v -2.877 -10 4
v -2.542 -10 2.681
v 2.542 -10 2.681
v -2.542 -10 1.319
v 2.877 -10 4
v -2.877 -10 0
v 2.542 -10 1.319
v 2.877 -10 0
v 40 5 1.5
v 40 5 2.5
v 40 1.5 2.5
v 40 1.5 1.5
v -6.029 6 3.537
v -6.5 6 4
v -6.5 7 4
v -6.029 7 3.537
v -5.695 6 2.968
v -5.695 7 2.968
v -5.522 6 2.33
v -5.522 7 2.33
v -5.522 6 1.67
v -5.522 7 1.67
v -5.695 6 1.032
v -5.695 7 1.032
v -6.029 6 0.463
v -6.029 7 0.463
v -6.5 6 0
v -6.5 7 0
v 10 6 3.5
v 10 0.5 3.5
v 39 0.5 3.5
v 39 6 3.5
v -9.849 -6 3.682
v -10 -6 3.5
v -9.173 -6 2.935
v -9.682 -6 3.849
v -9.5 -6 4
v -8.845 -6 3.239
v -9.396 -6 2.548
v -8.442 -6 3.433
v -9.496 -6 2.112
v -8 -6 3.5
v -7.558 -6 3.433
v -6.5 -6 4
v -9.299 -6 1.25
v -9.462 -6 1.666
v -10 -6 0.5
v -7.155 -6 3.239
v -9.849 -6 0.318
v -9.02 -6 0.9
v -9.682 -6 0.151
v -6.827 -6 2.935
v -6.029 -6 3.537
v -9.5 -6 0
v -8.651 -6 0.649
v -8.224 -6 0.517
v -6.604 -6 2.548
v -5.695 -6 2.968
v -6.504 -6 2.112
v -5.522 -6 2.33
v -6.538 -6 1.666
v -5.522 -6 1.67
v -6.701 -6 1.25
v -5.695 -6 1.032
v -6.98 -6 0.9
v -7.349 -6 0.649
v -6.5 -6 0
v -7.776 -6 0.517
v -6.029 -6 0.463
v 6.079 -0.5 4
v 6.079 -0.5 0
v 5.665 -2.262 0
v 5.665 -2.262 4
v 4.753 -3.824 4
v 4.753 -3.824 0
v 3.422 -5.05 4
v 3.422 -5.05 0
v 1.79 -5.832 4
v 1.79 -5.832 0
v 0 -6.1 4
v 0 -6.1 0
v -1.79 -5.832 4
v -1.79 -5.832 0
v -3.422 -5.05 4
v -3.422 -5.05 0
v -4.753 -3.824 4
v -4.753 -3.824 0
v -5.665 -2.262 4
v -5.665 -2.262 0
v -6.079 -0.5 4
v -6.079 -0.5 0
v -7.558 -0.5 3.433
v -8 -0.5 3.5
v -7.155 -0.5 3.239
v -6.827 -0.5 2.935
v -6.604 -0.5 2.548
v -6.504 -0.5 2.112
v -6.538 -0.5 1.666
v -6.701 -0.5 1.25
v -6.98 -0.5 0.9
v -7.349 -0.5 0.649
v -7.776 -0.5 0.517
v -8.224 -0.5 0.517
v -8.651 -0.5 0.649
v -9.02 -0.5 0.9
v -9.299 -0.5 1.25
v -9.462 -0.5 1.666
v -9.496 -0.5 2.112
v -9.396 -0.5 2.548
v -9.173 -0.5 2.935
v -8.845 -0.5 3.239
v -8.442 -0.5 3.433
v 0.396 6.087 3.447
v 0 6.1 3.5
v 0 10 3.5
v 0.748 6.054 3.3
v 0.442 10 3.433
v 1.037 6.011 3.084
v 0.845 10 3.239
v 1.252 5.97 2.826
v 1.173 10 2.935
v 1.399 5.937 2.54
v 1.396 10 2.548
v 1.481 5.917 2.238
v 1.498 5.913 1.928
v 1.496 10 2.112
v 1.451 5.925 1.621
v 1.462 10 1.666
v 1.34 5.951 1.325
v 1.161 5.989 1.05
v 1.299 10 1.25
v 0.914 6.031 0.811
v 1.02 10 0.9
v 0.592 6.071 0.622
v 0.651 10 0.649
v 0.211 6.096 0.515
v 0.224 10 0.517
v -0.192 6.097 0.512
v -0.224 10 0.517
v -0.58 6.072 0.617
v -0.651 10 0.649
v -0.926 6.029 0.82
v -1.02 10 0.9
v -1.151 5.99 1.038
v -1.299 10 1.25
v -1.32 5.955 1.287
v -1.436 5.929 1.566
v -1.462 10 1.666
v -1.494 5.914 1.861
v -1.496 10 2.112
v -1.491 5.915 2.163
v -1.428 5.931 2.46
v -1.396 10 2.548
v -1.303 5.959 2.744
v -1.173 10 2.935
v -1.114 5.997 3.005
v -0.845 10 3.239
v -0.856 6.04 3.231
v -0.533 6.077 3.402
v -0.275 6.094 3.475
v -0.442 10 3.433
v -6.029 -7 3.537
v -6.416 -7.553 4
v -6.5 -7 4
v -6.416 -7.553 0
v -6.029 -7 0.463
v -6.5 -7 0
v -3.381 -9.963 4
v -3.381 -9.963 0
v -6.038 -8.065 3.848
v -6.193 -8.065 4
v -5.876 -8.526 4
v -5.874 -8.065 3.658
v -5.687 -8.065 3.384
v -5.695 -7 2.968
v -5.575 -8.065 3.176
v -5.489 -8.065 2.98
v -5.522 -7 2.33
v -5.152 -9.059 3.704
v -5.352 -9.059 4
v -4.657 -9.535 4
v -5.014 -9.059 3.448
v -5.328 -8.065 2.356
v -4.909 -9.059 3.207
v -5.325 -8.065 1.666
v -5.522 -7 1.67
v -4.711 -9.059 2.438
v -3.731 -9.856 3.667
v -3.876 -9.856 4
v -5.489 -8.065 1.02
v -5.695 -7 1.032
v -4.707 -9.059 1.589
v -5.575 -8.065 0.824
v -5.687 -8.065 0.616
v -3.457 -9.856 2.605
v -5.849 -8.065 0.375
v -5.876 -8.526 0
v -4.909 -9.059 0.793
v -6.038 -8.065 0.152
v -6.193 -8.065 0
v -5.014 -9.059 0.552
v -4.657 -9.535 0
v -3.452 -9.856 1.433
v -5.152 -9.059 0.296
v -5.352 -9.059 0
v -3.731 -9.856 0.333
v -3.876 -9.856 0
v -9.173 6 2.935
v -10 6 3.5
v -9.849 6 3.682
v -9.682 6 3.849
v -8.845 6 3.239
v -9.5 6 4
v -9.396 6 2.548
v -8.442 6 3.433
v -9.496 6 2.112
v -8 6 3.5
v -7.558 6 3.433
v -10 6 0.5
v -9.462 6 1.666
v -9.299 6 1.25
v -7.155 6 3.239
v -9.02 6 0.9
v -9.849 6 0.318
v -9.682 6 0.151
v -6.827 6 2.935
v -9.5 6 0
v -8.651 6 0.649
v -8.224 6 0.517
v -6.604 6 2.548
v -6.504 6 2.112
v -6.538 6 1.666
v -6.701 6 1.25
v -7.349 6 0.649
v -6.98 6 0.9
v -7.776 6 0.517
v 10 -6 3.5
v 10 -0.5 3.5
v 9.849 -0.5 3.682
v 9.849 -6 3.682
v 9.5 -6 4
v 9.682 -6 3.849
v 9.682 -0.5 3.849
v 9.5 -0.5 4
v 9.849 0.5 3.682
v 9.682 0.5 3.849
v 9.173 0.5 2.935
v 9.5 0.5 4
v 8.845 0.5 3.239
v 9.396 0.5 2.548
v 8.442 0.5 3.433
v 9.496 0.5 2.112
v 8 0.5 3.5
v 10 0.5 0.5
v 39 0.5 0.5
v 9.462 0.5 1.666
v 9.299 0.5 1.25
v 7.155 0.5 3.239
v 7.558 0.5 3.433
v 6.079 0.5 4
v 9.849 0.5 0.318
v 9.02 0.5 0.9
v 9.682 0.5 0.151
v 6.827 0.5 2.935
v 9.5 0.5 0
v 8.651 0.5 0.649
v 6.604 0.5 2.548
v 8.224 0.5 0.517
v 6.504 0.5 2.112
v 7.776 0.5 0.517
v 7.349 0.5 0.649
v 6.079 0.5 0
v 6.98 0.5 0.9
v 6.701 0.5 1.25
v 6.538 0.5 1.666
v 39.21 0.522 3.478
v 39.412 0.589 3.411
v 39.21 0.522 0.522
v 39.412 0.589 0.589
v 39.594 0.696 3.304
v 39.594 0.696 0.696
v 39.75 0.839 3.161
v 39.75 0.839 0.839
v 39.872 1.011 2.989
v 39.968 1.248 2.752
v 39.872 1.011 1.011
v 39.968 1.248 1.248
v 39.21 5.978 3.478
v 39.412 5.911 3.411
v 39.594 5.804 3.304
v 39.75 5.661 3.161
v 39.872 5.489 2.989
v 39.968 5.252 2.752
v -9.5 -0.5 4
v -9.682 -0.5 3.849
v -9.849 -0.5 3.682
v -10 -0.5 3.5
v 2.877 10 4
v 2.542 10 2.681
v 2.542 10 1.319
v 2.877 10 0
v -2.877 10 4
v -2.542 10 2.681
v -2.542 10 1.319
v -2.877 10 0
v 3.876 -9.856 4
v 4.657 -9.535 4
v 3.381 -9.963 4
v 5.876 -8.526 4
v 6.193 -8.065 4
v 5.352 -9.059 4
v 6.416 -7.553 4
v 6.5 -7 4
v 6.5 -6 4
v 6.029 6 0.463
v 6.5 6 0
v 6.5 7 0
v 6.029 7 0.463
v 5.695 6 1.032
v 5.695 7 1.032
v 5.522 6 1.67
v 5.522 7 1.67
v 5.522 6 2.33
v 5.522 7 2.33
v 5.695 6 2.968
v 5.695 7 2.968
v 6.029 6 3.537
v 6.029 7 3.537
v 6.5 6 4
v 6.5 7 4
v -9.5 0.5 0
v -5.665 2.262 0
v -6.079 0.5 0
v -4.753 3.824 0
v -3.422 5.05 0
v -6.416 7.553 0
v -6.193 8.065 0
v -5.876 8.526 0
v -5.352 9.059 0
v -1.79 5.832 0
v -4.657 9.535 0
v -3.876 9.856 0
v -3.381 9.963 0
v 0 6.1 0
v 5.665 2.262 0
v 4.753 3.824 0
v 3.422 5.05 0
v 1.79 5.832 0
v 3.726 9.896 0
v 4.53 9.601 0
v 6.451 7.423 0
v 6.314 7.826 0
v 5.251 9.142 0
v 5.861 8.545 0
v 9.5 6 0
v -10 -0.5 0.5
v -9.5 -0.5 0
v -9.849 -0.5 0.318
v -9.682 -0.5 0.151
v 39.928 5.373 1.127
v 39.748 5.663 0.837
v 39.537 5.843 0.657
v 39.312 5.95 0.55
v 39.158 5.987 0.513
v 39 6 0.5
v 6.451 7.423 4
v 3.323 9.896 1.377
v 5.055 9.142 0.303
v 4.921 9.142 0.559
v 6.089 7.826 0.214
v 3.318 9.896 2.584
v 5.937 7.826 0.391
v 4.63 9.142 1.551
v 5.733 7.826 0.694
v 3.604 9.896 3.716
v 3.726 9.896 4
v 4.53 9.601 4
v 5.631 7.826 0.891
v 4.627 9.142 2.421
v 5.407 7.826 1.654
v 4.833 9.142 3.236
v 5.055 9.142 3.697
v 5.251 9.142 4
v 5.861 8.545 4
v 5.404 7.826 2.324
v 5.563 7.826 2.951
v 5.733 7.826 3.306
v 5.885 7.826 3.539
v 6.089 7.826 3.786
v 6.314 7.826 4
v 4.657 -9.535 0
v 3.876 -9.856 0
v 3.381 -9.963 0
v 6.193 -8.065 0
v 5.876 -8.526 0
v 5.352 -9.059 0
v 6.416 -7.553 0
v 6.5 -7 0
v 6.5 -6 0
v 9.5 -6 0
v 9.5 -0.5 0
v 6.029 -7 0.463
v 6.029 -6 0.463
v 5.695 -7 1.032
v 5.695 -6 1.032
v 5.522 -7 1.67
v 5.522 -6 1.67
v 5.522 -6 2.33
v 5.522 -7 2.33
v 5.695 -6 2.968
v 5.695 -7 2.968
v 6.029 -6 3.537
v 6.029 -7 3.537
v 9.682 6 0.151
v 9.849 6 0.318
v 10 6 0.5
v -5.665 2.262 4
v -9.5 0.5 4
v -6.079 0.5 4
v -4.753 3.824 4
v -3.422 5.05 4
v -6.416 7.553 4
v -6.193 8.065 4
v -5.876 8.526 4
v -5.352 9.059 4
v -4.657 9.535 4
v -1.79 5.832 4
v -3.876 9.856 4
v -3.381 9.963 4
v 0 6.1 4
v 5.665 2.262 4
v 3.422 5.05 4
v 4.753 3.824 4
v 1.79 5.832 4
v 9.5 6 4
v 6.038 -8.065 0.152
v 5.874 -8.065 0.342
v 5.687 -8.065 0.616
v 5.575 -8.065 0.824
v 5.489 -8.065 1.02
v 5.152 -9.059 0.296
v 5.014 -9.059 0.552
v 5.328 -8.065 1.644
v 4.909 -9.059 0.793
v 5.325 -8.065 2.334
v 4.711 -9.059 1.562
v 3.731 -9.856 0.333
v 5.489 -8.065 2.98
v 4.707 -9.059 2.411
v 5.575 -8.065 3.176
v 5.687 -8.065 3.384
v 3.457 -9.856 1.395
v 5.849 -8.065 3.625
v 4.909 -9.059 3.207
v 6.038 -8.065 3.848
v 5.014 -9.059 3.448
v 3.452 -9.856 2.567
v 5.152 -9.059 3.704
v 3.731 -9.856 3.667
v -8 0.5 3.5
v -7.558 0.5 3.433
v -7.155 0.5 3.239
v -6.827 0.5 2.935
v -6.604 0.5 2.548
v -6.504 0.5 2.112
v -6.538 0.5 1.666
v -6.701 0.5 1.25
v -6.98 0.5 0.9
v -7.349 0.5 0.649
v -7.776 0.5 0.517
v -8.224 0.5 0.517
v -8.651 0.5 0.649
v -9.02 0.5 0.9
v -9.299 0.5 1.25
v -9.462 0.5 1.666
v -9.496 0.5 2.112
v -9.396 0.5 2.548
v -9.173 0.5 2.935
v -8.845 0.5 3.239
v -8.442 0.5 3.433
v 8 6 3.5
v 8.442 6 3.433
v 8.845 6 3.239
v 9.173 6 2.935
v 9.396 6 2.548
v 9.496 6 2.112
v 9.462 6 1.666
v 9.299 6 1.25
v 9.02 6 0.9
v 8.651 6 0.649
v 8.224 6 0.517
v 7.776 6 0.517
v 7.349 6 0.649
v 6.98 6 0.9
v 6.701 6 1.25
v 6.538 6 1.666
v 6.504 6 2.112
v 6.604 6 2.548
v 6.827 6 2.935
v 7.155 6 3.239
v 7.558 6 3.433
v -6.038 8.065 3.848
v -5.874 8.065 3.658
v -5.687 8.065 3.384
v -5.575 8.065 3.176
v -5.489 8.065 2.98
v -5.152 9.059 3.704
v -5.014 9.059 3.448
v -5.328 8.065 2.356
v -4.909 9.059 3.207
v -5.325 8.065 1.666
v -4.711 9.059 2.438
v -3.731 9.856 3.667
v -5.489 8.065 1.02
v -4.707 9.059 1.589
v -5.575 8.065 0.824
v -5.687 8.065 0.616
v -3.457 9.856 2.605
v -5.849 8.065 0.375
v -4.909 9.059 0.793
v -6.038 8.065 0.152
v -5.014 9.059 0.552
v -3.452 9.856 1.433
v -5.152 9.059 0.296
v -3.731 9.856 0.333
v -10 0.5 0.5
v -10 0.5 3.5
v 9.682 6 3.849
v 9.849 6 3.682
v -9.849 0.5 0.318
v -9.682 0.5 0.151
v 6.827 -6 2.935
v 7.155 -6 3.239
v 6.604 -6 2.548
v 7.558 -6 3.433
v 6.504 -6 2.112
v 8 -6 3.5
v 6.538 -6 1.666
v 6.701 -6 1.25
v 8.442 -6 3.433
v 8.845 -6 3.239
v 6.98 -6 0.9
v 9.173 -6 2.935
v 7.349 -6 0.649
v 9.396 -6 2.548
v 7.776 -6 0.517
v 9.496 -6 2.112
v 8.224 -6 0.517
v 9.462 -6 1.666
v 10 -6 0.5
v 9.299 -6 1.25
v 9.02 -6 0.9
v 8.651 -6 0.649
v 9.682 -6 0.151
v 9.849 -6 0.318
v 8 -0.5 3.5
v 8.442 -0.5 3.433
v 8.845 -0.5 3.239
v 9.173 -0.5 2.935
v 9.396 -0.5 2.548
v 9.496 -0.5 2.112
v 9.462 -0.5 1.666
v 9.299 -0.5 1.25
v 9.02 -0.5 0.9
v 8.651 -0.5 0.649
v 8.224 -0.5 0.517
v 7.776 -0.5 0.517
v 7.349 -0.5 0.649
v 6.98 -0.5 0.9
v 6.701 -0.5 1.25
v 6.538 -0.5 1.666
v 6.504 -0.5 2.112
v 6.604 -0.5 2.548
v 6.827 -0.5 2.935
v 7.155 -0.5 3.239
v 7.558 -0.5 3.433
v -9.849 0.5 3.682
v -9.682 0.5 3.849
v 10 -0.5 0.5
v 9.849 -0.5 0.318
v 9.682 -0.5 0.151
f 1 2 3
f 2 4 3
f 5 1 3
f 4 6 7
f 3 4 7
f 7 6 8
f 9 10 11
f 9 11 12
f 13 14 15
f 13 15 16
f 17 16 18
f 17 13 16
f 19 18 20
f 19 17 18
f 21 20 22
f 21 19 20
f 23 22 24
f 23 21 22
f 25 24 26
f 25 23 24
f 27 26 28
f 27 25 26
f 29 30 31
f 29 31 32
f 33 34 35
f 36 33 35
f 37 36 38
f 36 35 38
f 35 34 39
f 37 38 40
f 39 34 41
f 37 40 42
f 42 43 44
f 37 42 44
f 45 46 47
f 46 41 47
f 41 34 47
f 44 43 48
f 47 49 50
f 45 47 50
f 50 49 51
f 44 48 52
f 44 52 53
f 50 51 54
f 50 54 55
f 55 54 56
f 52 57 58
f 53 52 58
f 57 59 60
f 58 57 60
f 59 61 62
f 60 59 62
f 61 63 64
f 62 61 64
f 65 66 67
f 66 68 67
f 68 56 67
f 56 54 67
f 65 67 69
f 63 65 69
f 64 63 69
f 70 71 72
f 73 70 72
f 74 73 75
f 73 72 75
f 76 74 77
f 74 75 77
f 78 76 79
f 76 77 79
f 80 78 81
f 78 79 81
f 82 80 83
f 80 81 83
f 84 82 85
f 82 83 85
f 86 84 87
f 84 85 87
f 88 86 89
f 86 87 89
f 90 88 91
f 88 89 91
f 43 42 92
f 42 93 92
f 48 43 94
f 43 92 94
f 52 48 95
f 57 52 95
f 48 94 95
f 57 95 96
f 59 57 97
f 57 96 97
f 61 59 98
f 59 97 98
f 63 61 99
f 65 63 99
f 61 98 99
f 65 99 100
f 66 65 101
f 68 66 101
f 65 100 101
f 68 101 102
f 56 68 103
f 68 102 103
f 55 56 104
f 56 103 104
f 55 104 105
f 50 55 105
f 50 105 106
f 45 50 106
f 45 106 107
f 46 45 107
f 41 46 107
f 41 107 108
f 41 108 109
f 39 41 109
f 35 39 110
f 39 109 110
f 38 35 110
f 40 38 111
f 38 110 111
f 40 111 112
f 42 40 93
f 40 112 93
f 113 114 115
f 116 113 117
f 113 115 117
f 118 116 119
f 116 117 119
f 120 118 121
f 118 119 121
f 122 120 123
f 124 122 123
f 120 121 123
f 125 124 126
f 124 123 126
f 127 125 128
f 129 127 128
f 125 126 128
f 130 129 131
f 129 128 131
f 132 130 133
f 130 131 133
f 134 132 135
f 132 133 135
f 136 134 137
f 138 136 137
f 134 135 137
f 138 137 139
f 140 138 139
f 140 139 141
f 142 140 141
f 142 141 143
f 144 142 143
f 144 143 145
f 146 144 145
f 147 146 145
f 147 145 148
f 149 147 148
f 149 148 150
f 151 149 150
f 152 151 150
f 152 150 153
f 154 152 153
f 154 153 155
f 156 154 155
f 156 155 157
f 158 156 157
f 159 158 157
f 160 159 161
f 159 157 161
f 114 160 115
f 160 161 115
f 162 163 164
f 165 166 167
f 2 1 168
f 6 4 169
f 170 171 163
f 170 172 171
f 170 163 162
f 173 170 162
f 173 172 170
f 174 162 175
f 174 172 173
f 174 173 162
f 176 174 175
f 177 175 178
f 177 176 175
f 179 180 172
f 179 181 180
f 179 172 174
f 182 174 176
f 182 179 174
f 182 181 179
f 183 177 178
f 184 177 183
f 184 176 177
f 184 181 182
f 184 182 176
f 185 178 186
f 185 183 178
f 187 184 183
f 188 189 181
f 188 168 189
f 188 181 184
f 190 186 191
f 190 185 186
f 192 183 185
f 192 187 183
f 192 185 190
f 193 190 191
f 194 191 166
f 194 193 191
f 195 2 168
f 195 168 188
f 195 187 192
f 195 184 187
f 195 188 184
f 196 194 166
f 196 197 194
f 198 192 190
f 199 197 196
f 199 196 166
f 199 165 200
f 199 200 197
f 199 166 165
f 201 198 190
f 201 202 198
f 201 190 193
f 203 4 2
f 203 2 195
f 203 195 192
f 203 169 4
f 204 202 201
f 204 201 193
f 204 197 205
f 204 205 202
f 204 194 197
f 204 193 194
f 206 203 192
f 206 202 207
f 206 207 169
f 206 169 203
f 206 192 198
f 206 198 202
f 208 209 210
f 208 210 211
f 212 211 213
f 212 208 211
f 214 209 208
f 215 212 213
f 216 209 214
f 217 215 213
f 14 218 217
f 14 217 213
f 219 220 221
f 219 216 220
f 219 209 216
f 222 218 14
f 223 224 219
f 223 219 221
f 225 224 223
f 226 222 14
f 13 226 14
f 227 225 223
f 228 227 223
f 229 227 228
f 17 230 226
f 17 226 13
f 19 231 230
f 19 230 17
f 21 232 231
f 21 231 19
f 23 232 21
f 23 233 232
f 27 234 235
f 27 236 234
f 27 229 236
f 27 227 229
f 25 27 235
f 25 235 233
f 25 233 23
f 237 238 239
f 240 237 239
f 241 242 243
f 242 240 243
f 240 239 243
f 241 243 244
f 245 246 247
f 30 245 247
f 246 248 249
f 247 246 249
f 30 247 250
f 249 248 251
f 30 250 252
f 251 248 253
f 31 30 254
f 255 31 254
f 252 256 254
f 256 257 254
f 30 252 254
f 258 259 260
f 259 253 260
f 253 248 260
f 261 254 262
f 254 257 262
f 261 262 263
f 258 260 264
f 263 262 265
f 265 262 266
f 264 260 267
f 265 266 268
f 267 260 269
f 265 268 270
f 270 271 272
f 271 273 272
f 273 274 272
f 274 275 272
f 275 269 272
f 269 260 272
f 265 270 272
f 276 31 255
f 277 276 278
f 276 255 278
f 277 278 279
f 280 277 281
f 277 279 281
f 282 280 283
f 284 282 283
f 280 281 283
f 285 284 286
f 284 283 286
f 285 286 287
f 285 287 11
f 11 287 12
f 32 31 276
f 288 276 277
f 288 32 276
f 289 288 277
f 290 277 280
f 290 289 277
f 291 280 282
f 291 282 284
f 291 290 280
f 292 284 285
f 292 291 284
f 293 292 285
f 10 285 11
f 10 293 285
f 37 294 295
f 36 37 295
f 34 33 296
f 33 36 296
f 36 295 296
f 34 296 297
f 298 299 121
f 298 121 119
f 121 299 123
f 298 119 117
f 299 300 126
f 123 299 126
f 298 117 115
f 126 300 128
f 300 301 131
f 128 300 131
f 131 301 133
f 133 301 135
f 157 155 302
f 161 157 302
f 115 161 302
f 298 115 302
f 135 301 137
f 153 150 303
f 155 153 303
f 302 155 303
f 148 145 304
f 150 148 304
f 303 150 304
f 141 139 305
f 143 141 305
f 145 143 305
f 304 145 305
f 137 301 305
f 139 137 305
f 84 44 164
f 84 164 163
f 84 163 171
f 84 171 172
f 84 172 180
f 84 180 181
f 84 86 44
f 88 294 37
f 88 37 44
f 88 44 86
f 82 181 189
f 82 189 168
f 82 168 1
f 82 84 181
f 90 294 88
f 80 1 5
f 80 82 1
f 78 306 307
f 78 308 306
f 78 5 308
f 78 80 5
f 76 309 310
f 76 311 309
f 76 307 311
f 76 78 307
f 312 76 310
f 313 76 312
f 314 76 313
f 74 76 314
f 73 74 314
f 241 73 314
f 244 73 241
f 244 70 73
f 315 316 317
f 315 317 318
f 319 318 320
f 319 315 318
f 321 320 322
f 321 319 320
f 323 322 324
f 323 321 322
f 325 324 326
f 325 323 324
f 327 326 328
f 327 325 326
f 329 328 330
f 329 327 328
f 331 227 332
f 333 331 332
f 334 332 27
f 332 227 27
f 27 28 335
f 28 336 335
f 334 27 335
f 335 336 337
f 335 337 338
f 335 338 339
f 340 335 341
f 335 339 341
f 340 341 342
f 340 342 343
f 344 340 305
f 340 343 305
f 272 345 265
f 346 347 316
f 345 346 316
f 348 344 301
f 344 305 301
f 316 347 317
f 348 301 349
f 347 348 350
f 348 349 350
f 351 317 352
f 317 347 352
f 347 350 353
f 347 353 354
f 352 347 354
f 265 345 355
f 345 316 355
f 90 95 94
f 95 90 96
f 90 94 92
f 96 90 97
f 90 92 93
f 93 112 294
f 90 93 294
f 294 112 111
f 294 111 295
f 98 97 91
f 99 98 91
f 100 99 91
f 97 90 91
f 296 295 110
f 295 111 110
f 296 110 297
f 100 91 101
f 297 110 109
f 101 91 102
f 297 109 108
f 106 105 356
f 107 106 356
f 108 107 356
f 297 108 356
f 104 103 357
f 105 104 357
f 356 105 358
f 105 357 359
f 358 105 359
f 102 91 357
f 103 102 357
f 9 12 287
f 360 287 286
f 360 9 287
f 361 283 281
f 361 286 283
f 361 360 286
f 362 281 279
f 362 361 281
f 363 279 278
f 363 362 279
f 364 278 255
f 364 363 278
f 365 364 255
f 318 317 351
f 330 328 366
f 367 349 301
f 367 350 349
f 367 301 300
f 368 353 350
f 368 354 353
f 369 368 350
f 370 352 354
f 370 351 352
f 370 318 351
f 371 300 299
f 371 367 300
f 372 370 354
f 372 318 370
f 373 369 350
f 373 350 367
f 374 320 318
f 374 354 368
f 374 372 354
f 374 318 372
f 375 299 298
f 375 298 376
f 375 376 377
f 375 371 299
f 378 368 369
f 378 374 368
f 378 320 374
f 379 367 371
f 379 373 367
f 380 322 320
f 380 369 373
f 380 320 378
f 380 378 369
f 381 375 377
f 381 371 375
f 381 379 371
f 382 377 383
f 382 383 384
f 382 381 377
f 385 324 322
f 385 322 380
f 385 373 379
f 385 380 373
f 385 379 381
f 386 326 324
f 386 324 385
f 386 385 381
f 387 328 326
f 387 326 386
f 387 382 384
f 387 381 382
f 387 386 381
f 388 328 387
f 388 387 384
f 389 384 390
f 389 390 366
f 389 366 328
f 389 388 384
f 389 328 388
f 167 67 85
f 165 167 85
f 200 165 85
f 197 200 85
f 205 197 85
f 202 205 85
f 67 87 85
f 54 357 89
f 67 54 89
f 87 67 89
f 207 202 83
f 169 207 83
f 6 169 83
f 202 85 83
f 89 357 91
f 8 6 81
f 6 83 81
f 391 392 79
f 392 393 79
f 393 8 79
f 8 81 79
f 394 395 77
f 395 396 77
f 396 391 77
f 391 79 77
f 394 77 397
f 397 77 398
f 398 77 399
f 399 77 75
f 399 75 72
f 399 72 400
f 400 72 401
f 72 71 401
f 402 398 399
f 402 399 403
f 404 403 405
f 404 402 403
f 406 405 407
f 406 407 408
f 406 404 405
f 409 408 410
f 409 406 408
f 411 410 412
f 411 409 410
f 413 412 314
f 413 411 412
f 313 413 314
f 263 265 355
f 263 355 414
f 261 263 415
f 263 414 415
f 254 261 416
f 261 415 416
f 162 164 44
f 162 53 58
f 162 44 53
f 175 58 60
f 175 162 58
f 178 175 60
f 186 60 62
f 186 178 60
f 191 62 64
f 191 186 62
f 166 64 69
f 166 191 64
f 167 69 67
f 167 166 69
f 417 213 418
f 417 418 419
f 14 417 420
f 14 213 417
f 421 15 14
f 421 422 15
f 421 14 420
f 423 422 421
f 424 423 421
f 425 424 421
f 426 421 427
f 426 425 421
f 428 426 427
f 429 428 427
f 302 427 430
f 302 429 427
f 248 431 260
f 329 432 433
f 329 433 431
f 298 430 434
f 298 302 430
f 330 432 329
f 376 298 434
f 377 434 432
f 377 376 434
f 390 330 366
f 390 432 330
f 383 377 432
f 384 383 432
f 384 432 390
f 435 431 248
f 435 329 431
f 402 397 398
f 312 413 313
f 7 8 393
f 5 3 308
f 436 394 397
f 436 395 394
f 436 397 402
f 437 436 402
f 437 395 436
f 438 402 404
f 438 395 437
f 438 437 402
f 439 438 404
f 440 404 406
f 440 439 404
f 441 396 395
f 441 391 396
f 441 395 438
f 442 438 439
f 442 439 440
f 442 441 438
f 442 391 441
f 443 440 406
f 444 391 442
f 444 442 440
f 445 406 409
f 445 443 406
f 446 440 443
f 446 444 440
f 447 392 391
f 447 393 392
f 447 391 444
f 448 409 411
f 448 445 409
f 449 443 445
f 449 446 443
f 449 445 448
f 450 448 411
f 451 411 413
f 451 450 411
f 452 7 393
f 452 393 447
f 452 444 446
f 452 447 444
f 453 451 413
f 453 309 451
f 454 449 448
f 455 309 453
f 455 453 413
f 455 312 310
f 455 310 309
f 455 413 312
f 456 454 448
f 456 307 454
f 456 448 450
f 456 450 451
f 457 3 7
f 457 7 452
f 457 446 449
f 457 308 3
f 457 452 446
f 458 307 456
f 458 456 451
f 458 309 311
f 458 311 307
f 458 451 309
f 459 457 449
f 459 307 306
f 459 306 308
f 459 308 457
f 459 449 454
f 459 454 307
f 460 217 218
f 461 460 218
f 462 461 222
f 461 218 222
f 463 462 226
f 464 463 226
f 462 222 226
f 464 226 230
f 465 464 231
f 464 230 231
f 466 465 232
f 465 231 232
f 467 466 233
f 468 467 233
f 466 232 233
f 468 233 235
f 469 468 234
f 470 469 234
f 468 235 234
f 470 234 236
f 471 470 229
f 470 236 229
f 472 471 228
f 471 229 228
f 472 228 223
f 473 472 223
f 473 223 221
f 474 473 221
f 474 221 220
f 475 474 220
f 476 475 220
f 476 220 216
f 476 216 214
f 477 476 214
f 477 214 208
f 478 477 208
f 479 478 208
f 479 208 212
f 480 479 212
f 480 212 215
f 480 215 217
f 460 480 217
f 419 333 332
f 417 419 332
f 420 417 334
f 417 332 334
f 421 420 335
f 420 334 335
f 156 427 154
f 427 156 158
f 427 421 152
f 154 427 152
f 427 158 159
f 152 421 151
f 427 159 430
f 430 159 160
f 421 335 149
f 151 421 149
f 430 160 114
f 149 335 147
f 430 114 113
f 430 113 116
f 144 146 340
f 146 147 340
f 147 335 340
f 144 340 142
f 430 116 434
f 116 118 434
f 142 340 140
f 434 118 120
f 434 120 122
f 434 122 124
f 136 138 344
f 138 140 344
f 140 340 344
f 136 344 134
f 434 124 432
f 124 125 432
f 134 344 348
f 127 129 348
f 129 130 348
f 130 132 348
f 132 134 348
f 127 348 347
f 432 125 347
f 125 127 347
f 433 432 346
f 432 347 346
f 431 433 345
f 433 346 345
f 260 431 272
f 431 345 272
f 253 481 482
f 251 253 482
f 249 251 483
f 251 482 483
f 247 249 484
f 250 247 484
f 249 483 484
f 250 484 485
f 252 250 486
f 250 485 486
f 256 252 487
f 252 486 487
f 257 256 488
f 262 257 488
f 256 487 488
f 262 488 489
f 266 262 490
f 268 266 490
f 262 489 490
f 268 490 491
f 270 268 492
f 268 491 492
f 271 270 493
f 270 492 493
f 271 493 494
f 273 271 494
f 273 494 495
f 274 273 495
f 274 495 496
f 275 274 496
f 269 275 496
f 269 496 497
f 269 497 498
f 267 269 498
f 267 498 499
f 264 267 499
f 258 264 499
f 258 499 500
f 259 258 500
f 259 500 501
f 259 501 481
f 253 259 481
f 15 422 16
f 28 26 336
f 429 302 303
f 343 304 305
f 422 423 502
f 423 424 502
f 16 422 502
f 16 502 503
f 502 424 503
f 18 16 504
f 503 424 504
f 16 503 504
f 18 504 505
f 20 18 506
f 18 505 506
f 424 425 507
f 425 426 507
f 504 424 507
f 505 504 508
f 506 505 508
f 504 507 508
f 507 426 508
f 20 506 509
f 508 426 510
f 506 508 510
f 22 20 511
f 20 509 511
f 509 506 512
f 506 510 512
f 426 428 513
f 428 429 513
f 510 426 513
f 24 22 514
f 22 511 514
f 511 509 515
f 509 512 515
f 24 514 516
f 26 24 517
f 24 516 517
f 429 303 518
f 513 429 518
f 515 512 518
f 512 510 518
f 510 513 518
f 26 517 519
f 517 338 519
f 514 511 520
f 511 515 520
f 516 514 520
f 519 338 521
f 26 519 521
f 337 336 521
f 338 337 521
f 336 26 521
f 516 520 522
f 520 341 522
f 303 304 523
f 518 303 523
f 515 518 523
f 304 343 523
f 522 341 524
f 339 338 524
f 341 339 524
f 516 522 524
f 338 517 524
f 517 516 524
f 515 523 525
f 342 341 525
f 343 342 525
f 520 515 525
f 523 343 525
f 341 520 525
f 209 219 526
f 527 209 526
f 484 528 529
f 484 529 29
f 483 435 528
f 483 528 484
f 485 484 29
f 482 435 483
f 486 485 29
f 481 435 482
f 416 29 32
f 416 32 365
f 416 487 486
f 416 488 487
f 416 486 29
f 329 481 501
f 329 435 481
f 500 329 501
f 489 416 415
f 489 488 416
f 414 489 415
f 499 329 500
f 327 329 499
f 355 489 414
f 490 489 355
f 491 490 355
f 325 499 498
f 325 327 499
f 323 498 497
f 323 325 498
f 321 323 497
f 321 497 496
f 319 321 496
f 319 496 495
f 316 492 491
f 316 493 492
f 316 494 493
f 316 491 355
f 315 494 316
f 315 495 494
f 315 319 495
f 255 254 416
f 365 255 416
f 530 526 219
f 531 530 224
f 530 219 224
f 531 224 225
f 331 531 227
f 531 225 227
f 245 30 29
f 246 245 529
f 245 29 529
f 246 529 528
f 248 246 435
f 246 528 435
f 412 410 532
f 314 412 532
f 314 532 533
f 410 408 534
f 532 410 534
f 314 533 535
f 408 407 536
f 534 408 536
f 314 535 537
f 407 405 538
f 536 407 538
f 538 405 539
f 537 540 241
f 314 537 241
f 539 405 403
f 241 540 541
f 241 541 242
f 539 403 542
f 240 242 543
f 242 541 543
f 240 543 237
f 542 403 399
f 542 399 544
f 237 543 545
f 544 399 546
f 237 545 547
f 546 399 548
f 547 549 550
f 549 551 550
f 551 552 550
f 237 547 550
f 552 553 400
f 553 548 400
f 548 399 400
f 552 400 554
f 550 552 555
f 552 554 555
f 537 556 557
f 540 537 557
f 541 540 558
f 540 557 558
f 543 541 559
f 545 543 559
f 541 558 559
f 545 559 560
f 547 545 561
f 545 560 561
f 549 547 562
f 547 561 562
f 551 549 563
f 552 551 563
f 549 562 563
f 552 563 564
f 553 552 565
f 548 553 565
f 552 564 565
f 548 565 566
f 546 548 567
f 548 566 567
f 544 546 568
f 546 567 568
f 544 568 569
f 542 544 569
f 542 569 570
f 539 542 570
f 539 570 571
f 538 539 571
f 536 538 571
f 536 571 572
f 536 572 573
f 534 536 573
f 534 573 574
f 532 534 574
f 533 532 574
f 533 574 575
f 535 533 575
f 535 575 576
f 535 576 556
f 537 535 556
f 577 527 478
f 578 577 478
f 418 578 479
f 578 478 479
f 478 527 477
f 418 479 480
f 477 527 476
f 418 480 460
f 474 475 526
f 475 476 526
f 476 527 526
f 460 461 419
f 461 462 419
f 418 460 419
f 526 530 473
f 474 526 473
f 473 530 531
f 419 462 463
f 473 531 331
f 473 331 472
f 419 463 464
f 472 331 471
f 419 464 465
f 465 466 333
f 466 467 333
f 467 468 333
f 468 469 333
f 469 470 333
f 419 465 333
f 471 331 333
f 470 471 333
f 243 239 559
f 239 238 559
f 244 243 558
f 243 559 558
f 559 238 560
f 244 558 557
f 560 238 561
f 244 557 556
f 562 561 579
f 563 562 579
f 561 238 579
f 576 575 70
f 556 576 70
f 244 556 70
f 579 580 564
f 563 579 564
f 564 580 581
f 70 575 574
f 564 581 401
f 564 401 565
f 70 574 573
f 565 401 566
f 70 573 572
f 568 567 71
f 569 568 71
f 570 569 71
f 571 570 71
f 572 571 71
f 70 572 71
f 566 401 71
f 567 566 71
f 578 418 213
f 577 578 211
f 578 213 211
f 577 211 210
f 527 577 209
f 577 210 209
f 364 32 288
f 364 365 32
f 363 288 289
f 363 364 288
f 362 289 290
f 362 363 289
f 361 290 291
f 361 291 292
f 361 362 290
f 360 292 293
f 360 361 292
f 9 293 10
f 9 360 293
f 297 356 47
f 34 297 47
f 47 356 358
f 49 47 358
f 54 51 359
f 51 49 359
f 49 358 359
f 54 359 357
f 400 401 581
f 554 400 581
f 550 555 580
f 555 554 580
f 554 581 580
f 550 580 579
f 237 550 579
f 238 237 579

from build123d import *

# Parameters (mm, degrees)
BOSS_EXTRUDE1_DEPTH   = 4
BOSS_EXTRUDE1_2_DEPTH = 4
CUT_EXTRUDE1_START    = -10
SKETCH2_R             = 2.5
SKETCH2_R_2           = 1.5
CUT_EXTRUDE1_DEPTH    = 4
CUT_EXTRUDE2_START    = 6
SKETCH3_R             = 2.5
SKETCH3_R_2           = 1.5
CUT_EXTRUDE2_DEPTH    = 4
SKETCH4_R             = 1.5
CUT_EXTRUDE3_DEPTH    = 23.715633383
SKETCH5_R             = 1.5
CUT_EXTRUDE4_DEPTH    = 6
FILLET1_R             = 3
FILLET2_R             = 3
SKETCH6_W             = 3
SKETCH6_H             = 5.5
BOSS_EXTRUDE2_DEPTH   = 30
FILLET3_R             = 1


with BuildPart() as part:
    # Sketch1 → Boss-Extrude1 (new body)
    with BuildSketch(Plane.XY):
        with BuildLine():
            Line((-10, -0.5), (-10, -10))
            Line((-10, -10), (10, -10))
            Line((10, -10), (10, -0.5))
            Line((10, -0.5), (6.079473661, -0.5))
            ThreePointArc((6.079473661, -0.5), (0, -6.1), (-6.079473661, -0.5))
            Line((-6.079473661, -0.5), (-10, -0.5))
        make_face()
    extrude(amount=BOSS_EXTRUDE1_DEPTH)

    # Sketch2 → Cut-Extrude1 (cut)
    # profile 1 of 2: a face of its own
    with BuildSketch(Plane(origin=(0, 0, 0), x_dir=(1, 0, 0), z_dir=(0, 1, 0)).offset(CUT_EXTRUDE1_START)):
        with Locations((8, -2)):
            Circle(SKETCH2_R)
    # profile 2 of 2: a face of its own
    with BuildSketch(Plane(origin=(0, 0, 0), x_dir=(1, 0, 0), z_dir=(0, 1, 0)).offset(CUT_EXTRUDE1_START)):
        with Locations((-8, -2)):
            Circle(SKETCH2_R)
        with Locations(Location((-8, -2, 0), (0, 0, 270))):
            Circle(SKETCH2_R_2, mode=Mode.SUBTRACT)
    extrude(amount=CUT_EXTRUDE1_DEPTH, mode=Mode.SUBTRACT)


with BuildPart() as body_2:
    # Sketch1 → Boss-Extrude1 2 (new body)
    with BuildSketch(Plane.XY):
        with BuildLine():
            Line((-10, 10), (-10, 0.5))
            Line((-10, 0.5), (-6.079473661, 0.5))
            ThreePointArc((-6.079473661, 0.5), (0, 6.1), (6.079473661, 0.5))
            Line((6.079473661, 0.5), (10, 0.5))
            Line((10, 0.5), (10, 10))
            Line((10, 10), (-10, 10))
        make_face()
    extrude(amount=BOSS_EXTRUDE1_2_DEPTH)

    # Sketch3 → Cut-Extrude2 (cut)
    # profile 1 of 2: a face of its own
    with BuildSketch(Plane(origin=(0, 0, 0), x_dir=(1, 0, 0), z_dir=(0, 1, 0)).offset(CUT_EXTRUDE2_START)):
        with Locations((-8, -2)):
            Circle(SKETCH3_R)
        with Locations(Location((-8, -2, 0), (0, 0, 270))):
            Circle(SKETCH3_R_2, mode=Mode.SUBTRACT)
    # profile 2 of 2: a face of its own
    with BuildSketch(Plane(origin=(0, 0, 0), x_dir=(1, 0, 0), z_dir=(0, 1, 0)).offset(CUT_EXTRUDE2_START)):
        with Locations((8, -2)):
            Circle(SKETCH3_R)
        with Locations(Location((8, -2, 0), (0, 0, 270))):
            Circle(SKETCH3_R_2, mode=Mode.SUBTRACT)
    extrude(amount=CUT_EXTRUDE2_DEPTH, mode=Mode.SUBTRACT)


with BuildPart() as cut_extrude3_tool:
    # Sketch4 → Cut-Extrude3 (new, through all)
    with BuildSketch(Plane(origin=(0, 10, 0), x_dir=(1, 0, 0), z_dir=(0, 1, 0))):
        with Locations(Location((8, -2, 0), (0, 0, 270))):
            Circle(SKETCH4_R)
        with Locations(Location((-8, -2, 0), (0, 0, 270))):
            Circle(SKETCH4_R)
        with BuildLine():
            Line((-10, -3.5), (-10, -4))
            Line((-10, -4), (-9.5, -4))
            ThreePointArc((-9.5, -4), (-9.767766953, -3.767766953), (-10, -3.5))
        make_face()
        with BuildLine():
            Line((-9.5, 0), (-10, 0))
            Line((-10, 0), (-10, -0.5))
            ThreePointArc((-10, -0.5), (-9.767766953, -0.232233047), (-9.5, 0))
        make_face()
        with BuildLine():
            Line((10, -0.5), (10, 0))
            Line((10, 0), (9.5, 0))
            ThreePointArc((9.5, 0), (9.767766953, -0.232233047), (10, -0.5))
        make_face()
        with BuildLine():
            Line((9.5, -4), (10, -4))
            Line((10, -4), (10, -3.5))
            ThreePointArc((10, -3.5), (9.767766953, -3.767766953), (9.5, -4))
        make_face()
    extrude(amount=-CUT_EXTRUDE3_DEPTH)


with BuildPart() as part_1:
    add(part.part)

    # Cut-Extrude3: cut by cut_extrude3_tool
    add(cut_extrude3_tool.part, mode=Mode.SUBTRACT)

    # Fillet2
    fillet2_edges = [part_1.edges().sort_by_distance(p)[0] for p in [
        (-5.5, -10, 2),
        (5.5, -10, 2),
    ]]
    fillet(fillet2_edges, radius=FILLET2_R)


with BuildPart() as body_2_1:
    add(body_2.part)

    # Cut-Extrude3: cut by cut_extrude3_tool
    add(cut_extrude3_tool.part, mode=Mode.SUBTRACT)

    # Sketch5 → Cut-Extrude4 (cut)
    with BuildSketch(Plane(origin=(0, 10, 0), x_dir=(1, 0, 0), z_dir=(0, 1, 0))):
        with Locations(Location((0, -2, 0), (0, 0, 270))):
            Circle(SKETCH5_R)
    extrude(amount=-CUT_EXTRUDE4_DEPTH, mode=Mode.SUBTRACT)

    # Fillet1
    fillet1_edges = [body_2_1.edges().sort_by_distance(p)[0] for p in [
        (-5.5, 10, 2),
        (5.5, 10, 2),
    ]]
    fillet(fillet1_edges, radius=FILLET1_R)

    # Sketch6 → Boss-Extrude2 (add)
    with BuildSketch(Plane(origin=(10, 0, 0), x_dir=(0, 0, -1), z_dir=(1, 0, 0))):
        with Locations((-2, 3.25)):
            Rectangle(SKETCH6_W, SKETCH6_H)
    extrude(amount=BOSS_EXTRUDE2_DEPTH)

    # Fillet3
    fillet3_edges = [body_2_1.edges().sort_by_distance(p)[0] for p in [
        (40, 3.25, 3.5),
        (40, 0.5, 2),
        (40, 3.25, 0.5),
        (40, 6, 2),
    ]]
    fillet(fillet3_edges, radius=FILLET3_R)


solid = Compound([part_1.part, body_2_1.part])
